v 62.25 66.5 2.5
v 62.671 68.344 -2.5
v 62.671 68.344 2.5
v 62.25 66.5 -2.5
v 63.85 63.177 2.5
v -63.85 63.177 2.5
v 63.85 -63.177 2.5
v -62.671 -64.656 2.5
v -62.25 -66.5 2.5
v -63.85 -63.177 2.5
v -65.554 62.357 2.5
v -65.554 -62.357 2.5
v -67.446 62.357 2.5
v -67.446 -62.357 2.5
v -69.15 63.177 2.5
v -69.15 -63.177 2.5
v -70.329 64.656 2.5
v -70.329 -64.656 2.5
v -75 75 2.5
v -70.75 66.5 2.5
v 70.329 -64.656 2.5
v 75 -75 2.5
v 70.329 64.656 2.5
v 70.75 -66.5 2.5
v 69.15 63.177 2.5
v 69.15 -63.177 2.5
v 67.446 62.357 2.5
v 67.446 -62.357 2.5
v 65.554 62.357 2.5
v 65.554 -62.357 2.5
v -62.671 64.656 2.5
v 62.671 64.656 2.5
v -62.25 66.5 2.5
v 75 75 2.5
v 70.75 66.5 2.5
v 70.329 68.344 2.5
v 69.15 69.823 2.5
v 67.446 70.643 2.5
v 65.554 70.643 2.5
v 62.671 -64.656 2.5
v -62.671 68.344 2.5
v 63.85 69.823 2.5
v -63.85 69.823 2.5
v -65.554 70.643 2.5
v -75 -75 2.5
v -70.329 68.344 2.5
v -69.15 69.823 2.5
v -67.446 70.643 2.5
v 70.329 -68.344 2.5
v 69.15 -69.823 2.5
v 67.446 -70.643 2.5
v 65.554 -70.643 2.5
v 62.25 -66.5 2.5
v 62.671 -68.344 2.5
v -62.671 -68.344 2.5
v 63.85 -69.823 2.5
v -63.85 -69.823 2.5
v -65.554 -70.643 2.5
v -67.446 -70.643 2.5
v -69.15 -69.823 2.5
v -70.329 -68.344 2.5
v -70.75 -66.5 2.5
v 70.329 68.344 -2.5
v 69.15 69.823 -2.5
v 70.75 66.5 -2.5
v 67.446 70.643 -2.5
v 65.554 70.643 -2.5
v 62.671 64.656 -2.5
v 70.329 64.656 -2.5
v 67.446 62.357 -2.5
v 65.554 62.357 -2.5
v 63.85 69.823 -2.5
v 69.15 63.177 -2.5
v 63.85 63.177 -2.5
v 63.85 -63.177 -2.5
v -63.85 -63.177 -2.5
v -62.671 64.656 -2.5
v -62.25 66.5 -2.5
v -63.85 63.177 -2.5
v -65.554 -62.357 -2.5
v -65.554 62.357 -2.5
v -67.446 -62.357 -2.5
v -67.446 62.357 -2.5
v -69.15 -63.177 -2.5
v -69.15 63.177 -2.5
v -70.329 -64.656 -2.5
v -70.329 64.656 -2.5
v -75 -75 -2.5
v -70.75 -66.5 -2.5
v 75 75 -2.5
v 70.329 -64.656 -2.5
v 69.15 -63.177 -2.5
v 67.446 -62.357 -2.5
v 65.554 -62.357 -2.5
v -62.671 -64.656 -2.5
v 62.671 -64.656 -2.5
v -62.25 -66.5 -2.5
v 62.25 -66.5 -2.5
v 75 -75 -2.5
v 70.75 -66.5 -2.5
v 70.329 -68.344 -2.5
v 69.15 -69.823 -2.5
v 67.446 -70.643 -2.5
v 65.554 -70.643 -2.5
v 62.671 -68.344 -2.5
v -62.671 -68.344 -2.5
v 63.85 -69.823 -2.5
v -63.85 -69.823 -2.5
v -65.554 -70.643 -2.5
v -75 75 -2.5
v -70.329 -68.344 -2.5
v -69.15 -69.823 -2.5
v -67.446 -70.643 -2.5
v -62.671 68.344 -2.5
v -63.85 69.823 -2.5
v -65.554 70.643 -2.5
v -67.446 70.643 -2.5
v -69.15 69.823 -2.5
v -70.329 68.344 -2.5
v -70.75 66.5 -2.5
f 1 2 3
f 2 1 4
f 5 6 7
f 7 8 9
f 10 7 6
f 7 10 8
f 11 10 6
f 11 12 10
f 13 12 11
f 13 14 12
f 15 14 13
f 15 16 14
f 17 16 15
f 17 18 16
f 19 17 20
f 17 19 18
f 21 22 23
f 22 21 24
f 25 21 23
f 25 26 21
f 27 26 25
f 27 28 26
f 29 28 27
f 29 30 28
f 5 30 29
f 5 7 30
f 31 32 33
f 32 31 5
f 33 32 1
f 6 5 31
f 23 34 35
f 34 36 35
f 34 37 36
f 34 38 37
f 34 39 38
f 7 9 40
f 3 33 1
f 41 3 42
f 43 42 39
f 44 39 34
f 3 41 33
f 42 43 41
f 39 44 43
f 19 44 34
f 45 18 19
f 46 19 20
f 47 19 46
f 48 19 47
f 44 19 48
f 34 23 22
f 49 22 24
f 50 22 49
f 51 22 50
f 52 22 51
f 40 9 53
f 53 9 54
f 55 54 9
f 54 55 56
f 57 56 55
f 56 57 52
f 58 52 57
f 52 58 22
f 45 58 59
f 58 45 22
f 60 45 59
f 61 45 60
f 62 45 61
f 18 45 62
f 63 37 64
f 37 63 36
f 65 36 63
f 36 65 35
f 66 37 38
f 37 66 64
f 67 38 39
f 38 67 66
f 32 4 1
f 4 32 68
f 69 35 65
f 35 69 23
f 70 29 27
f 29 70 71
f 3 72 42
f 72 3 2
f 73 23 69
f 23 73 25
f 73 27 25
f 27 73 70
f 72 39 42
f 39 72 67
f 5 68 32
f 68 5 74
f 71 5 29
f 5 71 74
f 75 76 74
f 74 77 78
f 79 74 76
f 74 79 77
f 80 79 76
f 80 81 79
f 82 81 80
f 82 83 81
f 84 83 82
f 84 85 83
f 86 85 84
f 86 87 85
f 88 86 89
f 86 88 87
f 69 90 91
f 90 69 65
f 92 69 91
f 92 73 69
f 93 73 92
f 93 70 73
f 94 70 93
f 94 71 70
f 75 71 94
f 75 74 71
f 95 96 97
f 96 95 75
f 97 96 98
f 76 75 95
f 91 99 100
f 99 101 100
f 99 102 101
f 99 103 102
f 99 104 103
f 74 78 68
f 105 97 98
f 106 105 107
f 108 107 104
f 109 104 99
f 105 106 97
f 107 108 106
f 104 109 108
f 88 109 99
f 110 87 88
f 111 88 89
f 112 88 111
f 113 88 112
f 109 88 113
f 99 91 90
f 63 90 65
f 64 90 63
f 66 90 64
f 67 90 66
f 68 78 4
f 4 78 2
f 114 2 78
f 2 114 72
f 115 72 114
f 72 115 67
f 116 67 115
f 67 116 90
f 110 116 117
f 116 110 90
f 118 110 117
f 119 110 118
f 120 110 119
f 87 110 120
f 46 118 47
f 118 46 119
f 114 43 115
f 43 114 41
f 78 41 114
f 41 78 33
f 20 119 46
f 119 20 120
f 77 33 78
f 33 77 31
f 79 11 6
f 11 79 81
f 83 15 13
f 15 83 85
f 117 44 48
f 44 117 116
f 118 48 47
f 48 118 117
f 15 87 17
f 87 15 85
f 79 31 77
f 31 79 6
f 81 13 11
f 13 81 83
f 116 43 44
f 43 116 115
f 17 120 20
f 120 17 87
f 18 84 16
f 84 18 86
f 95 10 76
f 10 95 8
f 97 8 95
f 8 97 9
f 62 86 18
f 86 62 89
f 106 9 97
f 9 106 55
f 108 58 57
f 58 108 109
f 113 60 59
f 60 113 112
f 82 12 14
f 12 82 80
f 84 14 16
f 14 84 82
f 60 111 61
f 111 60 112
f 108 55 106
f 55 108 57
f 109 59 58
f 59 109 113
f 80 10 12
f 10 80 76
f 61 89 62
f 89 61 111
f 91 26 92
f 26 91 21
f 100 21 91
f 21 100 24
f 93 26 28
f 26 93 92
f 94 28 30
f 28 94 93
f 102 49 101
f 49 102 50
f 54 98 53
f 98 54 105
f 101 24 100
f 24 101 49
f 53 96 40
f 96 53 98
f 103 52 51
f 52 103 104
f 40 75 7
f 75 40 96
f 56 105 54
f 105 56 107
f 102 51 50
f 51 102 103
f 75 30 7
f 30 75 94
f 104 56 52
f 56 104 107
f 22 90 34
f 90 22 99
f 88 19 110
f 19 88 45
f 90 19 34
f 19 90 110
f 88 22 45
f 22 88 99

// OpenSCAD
// Generated by SolidPython 1.1.3 on 2023-12-07 16:50:21


difference() {
	cube(center = true, size = [150, 150, 5]);
	union() {
		translate(v = [66.5000000000, 66.5000000000]) {
			cylinder(center = true, h = 5, r = 4.2500000000);
		}
		translate(v = [-66.5000000000, 66.5000000000]) {
			cylinder(center = true, h = 5, r = 4.2500000000);
		}
		translate(v = [-66.5000000000, -66.5000000000]) {
			cylinder(center = true, h = 5, r = 4.2500000000);
		}
		translate(v = [66.5000000000, -66.5000000000]) {
			cylinder(center = true, h = 5, r = 4.2500000000);
		}
	}
}
/***********************************************
*********      SolidPython code:      **********
************************************************
 
import solid
import numbers
import pudb
from solid.utils import *
import viewscad
import subprocess
import os
import os.path as osp
import math
import sys

chamfer_extrude=solid.import_scad("./chamfer_extrude.scad")
chamfer_extrude=chamfer_extrude.chamfer_extrude
r = viewscad.Renderer(width=800, height=800)

def debug(model,f_name,path="/home/ts/code/projects/mfd/designs/debug"):
    solid.scad_render_to_file(model,osp.join(path,f_name)+".scad")
#generate position list of wells using offset from center
wells_pos_from_center_4 = lambda offset: [[-offset,offset],
                                        [offset, offset],
                                        [-offset, -offset],
                                        [offset, -offset]]
#wells_pos_from_center_2 = lambda offset: [[0,offset],
#                                        [0, -offset]]
wells_pos_from_center_2 = lambda offset: [[offset,0],
                                        [-offset,0]]

def make_well(dims,shape=None,height=None,dxf=False):
    def circle_cylinder():
        if dxf or (height is None):
            well = solid.circle(r=dims, segments=64)
        else:
            well = solid.cylinder(r=dims, h=height, segments=64, center = True)
        return well
    if dims is None:
        sys.exit("radius needs to be a number")
    if isinstance(dims, numbers.Number):
        well =circle_cylinder()
    elif len(dims)==1:
        if isinstance(dims[1], numbers.Number):
            well =circle_cylinder()
        else:
            sys.exit("radius needs to be a number")
    elif len(dims)==2:
        well = solid.square(dims,center = True)
    elif len(dims)==3:
        well = solid.cube(dims, center = True)
    return well

def wells_top_bottom(center_gap,device_dims=None,shape=None,height=None, positions = None, dxf = False,well_shape=None):
    if well_shape == None:
        well_shape = make_well(device_dims,shape=shape,height=height,dxf=dxf)
    wells = []
    if positions is None:
        offset = radius+radius/2.0
        positions = wells_pos_from_center_2(offset)
    if dxf or (height is None):
        height = 0
    for position in positions:
        if dxf:
            wells.append(solid.translate([position[0],position[1]])(well_shape))
        else:
            wells.append(solid.translate([position[0],position[1],height/2.0])(well_shape))
    return  union()(*wells)

#place wells in four corners 
def four_corner(radius,height=None, positions = None, dxf = False):
    #if well pos not specified set
    #to equally spaced by half radius
    if positions is None:
        offset = radius+radius/2.0
        positions = wells_pos_from_center_4(offset)
    if dxf or (height is None):
        height = 0
    #make wells at positions with specified radius and height
    wells = []
    for position in positions:
        #make circle if making dxf
        if dxf:
            well_shape = solid.circle(r=radius, segments=64)
            well_shape = solid.translate([position[0],position[1]])(well_shape)
        #if stl make cylinder
        else:
            well_shape = solid.cylinder(r=radius, h=height, segments=64, center = True)
            well_shape = solid.translate([position[0],position[1],height/2.0])(well_shape)
        wells.append(well_shape)
    return  union()(*wells)

#generate channels 
def make_channels(length,width,height=0,num_chans=1,max_chans=None,spacing=None, dxf = False,
                  rotate_channels=False):
    if dxf or (height is None):
        height = 0
    #if channel gap not defined, is equal to
    if spacing is None: spacing = width
    #calculate number of channels if fitting max num within given width
    if not max_chans is None:
        import math
        num_chans = math.floor((max_chans-spacing)/(width+spacing))
    #get total width of channel section  
    total_width = (width*num_chans)+(spacing*(num_chans-1))

    #make template channel
    #if rotate_channels: width, length = length, width
    if dxf:
        channel_t = solid.square([length,width],center = True)
    else:
        channel_t = solid.cube([length,width,height], center = True)

    #if number channels is even, offset the first channel to center its gap
    if num_chans % 2 == 0: centering = -(width/2.0+spacing/2.0)
    else: centering = 0
    #move template channel up to align bottom at z = 0 
    #and offset center if necessary
    if dxf:
        channel_t = solid.translate([0,centering])(channel_t)
    else:
        channel_t = solid.translate([0,centering,height/2.0])(channel_t)

    #if rotate_channels: length,width = width,length
    #start making the channels
    channels = []
    for i in range(num_chans):
        #if i=0 there is no translation
        #if i=1, we make the first channel adjacent to second
        direction = i

        #if i>=1, we add channels alternating left and right
        if i >= 1:
            direction = -(i/2.0)
            if i % 2 == 1: direction = (-direction)+0.5
                
        #make channel at right position and add it to channel list
        translation_coords = [0,direction*(width+spacing)]
        #if rotate_channels: translation_coords = [direction*(width+spacing),0]
        if dxf:
            channel = solid.translate(translation_coords)(channel_t)
        else:
            channel = solid.translate([*translation_coords,0])(channel_t)
        channels.append(channel)
    
    #group all channels as one object
    channels = union()(*channels)
    #compute the x,y,z dimensions in order to pass as arguments 
    #for construction of other parts of device (such as the chambers)
    measurements = {'x':(length/2.0,-length/2.0),
                    'y':(total_width/2.0,-total_width/2.0)}
    if not dxf:
        measurements['z'] = (height,0)
    if rotate_channels:
        channels = solid.rotate(90)(channels)
        measurements['x'],measurements['y']=measurements['y'],measurements['x']
    return channels,measurements

def make_chambers(msrs,height=None,extra=0,len_until=None,width=None, dxf = False):
    #computes x,y,z length
    total = lambda x : abs(x[0]) + abs(x[1])
    
    #if specific height if specified
    #otherwise use same height as channels
    if dxf:
        pass
    elif not height is None:
        msrs['z'] = (height,0)
    else:
        msrs['z'] = (0,0)
        
    #make copy of measurements from channels to modify chamber dimensions 
    #and add length to chambers as specified
    chamber_dims = msrs.copy()
    #calculate length of chamber to reach specified offset
    if not len_until is None:
        chamber_len = len_until-(msrs['x'][0])
    #or add specified length to channel length (if not specified, adds 0)
    else:
        chamber_len = msrs['x'][0]+extra
    #set the chamber length based 
    chamber_dims['x'] = (chamber_len/2.0,-(chamber_len/2.0))
    #compute final dimensions of chamber
    if not width is None:
        chamber_dims['y'] = (width/2.0,-width/2.0)
    chamber_dims = [total(size) for size in chamber_dims.values()]
        
    #calculate chamber translation offset to place adjacent to channels
    chamber_trslt = msrs['x'][0]+(chamber_len/2.0)
    #compute chamber translation coordinates to align with channels
    #x = 1 moves chamber above channels
    #x = -1 moves chamber below channels
    if dxf:
        trslt = lambda x : [x*(chamber_trslt),0]
    else:
        trslt = lambda x : [x*(chamber_trslt),0,msrs['z'][0]/2.0]
    
    #function to make chamber at top or at bottom 
    if dxf:
        move = lambda x : solid.translate(trslt(x))(solid.square(chamber_dims, center = True) )
    else:
        move = lambda x : solid.translate(trslt(x))(solid.cube(chamber_dims,center = True))
    #make top and bottom chambers and return them as grouped
    top = move(1)
    bottom = move(-1)
    #chambers=solid.rotate(90)(solid.union()(top,bottom))
    chambers=(solid.union()(top,bottom))

    return chambers

#create alignment features 
def alignment_features(unit,dims,grid_size, mask_size = None, alignment = "hollow", units_from_center = (2.5,2.5), corner_len=None):
    width = grid_size[0]*dims[0]
    length = grid_size[1]*dims[1]
    if mask_size is None and corner_len is None:
        corner_len = (dims[0] + dims[1]) /2 / 8
    corner = lambda thickness_div : solid.union()( solid.square([corner_len,corner_len/thickness_div],center=False), solid.square([corner_len/thickness_div,corner_len],center=False) )
    
    def make_full(thickness_div):
        thickness = corner_len/thickness_div
        tr = solid.translate([0, 0, 0 ])(solid.rotate(180)(corner(thickness_div)))
        tr = solid.translate([thickness/2,thickness/2,0])(tr)
        bl = solid.translate([0, 0, 0 ])(solid.rotate(0)(corner(thickness_div)))
        bl = solid.translate([-thickness/2,-thickness/2,0])(bl)
        return solid.union()(tr,bl)
    
    def make_hollow(thickness_div):
        thickness = corner_len/(thickness_div/2)
        inner = make_full(thickness_div)
        outer = make_full(thickness_div/2)
        hollow = outer - inner 
        return hollow
    
    center = (width /2 , length/2)
    mask_pos = lambda x,y : (center[0] + x*(float(units_from_center[0])*dims[0]), center[1] + y*(float(units_from_center[1])*dims[1]))
    positions = []
    positions.append(mask_pos(1,0))
    positions.append(mask_pos(0,1))
    positions.append(mask_pos(-1,0))
    positions.append(mask_pos(0,-1))
    make_mask = lambda mtype : make_hollow(8) if mtype == "hollow" else make_full(8)
    masks = [ solid.translate([*position,0])(make_mask(alignment)) for position in positions]
    
    solid.scad_render_to_file(solid.union()(*masks),"./designs/open_chamber/masks.scad")
    #return unit - solid.union()(*masks)
    return solid.union()(*masks,unit)

def create_outline(thickness, array, dims, grid_size,):
    width = grid_size[0]*dims[0] + thickness *2
    length = grid_size[1]*dims[1] + thickness *2
    outer = solid.translate([-thickness, -thickness,0])(solid.square([width, length]))
    return outer-array

def create_wall(wall_thickness, outline_thickness, dims, grid_size, wall_height = 2000, dxf = False):
    inner_width = grid_size[0]*dims[0] + outline_thickness *2
    inner_length = grid_size[1]*dims[1] + outline_thickness *2
    outer_width = inner_width + wall_thickness * 2
    outer_length = inner_length + wall_thickness * 2
    outer_pos_x = -outline_thickness-wall_thickness
    outer_pos_y = -outline_thickness-wall_thickness
    inner_pos_x = -outline_thickness
    inner_pos_y = -outline_thickness
    if dxf:
        inner_wall = solid.translate([inner_pos_x,
                                      inner_pos_y,
                                      0])(solid.square([inner_width, inner_length]))
        outer_wall = solid.translate([outer_pos_x,
                                      outer_pos_y,
                                      0])(solid.square([outer_width, outer_length]))

        return outer_wall-inner_wall
    else:
        inner_wall = solid.translate([inner_pos_x,
                                      inner_pos_y,
                                      0])(solid.cube([inner_width, inner_length,wall_height]))
        outer_wall = solid.translate([outer_pos_x,
                                      outer_pos_y,
                                      0])(solid.cube([outer_width, outer_length,wall_height]))

        return outer_wall-inner_wall, {'wall_height': wall_height,
                                       'wall_thickness': wall_thickness,
                                       'inner_width':inner_width,
                                       'inner_length': inner_length,
                                       'outer_width': outer_width,
                                       'outer_length': outer_length,
                                       'outer_pos_x' : outer_pos_x,
                                       'outer_pos_y' : outer_pos_y,
                                       'inner_pos_x' : inner_pos_x,
                                       'inner_pos_y' : inner_pos_y}

def create_thicker_wall(wall_thickness, outer_wall_offset, wall_dims, dims, grid_size, height_start = .2, height_end=2, dxf = False):
    addon_wall,thicker_wall_dims = create_wall(wall_thickness, outer_wall_offset, dims, grid_size, wall_height=height_end-height_start, dxf = False)
    addon_wall = solid.translate([0,0,height_start])(addon_wall)

    thicker_wall_dims['wall_height'] = height_end
    thicker_wall_dims['wall_thickness'] = wall_dims['wall_thickness'] + wall_thickness
    return addon_wall, thicker_wall_dims
 
def add_lock_to_wall(wall,wall_dims,y_offset = 0,cut_ratio=0.7,L_length=3, gap_ratio=0.05, axis="x",width_ratio=1/2):
    # Makes L shape
    def make_L(max_length,length_thickness,max_width,width_thickness,height,y_offset):
        length = solid.cube([max_length,length_thickness,height])
        width = solid.cube([width_thickness,max_width,height])
        width = solid.translate([max_length-(width_thickness),0,0])(width)
        L = solid.union()(width,length)
        debug(L,"L")
        if axis == "x":
            L = solid.rotate(-90)(L)
            L = solid.translate([0,max_length,0])(L)
        else:
            L = solid.rotate(-180)(L)
            L = solid.translate([max_length,max_width,0])(L)
        return solid.translate([0,0,y_offset])(L)
    
    lock_length = L_length
    lock_width = wall_dims['wall_thickness']*width_ratio
    lock_length_thickness = lock_width/2
    lock_width_thickness = lock_width/2
    L_lock = make_L(lock_length,lock_length_thickness,lock_width,lock_width_thickness, wall_dims['wall_height']-y_offset, y_offset)
    
    margin_space = lock_length - lock_length*(1-gap_ratio)
    key_length = lock_length-margin_space
    key_length_thickness = lock_length_thickness-(margin_space*2)
    key_width = lock_width-(margin_space*2)
    key_width_thickness = lock_width_thickness-(margin_space*2)
    L_key = make_L(key_length,key_length_thickness,key_width,key_width_thickness, wall_dims['wall_height']-y_offset, y_offset)
    L_key = solid.translate([margin_space,margin_space,0])(L_key)
    L = solid.union()(L_lock,L_key)
    debug(L,"L")
    
    #Make cube to be used as negative to split frame in a half
    #Can choose if making left or right negative, specify ratio of split
    def make_negative(right,cut_ratio):
        if axis == "x":
            if right:
                length = wall_dims['outer_length']*(1-cut_ratio)
                pos_x = wall_dims['outer_pos_x']+(wall_dims['outer_length']*cut_ratio)
            else:
                length = wall_dims['outer_length']*(cut_ratio)
                pos_x = wall_dims['outer_pos_x'] 
            negative = solid.cube([wall_dims['outer_width'],length, wall_dims['wall_height']])
            negative = solid.translate([wall_dims['outer_pos_y'],pos_x,0])(negative)
        else:
            if right:
                length = wall_dims['outer_width']*(1-cut_ratio)
                pos_x = wall_dims['outer_pos_y']+(wall_dims['outer_width']*cut_ratio)
            else:
                length = wall_dims['outer_width']*(cut_ratio)
                pos_x = wall_dims['outer_pos_y'] 
            negative = solid.cube([length,wall_dims['outer_length'], wall_dims['wall_height']])
            negative = solid.translate([pos_x,wall_dims['outer_pos_x'],0])(negative)
        return negative, pos_x, length 
                      
    #Make negatives
    negative_right, right_half_pos_x, right_half_length = make_negative(True,cut_ratio)
    negative_left, left_half_pos_x, right_half_length = make_negative(False,cut_ratio)
    #Make halves
    left_half = solid.difference()(wall,negative_right)
    right_half = solid.difference()(wall,negative_left)
    def place_L(L, L_length,L_width):
        #Place L on top wall       
        offset_to_center = (wall_dims['wall_thickness']-L_width)/2
        if axis == "x":
            y_pos_top = (wall_dims['outer_pos_y'] +
                    wall_dims['outer_width'] - 
                    L_width - offset_to_center)
            top_L = solid.translate([y_pos_top,
                                     right_half_pos_x-(L_length),
                                     0])(L)
            #Place L on bottom wall       
            y_pos_bottom = wall_dims['outer_pos_y']+offset_to_center
            bottom_L = solid.translate([y_pos_bottom,
                                        right_half_pos_x-L_length,
                                        0])(L)
        else:
            y_pos_top = (wall_dims['outer_pos_x'] +
                    wall_dims['outer_length'] -
                    (L_width+offset_to_center))
            top_L = solid.translate([right_half_pos_x-L_length,
                                     y_pos_top,
                                     0])(L)
            #Place L on bottom wall       
            y_pos_bottom = wall_dims['outer_pos_y']+offset_to_center
            bottom_L = solid.translate([right_half_pos_x-L_length,
                                        y_pos_bottom,
                                        0])(L)
        return bottom_L, top_L
    #Make complimentary L pieces through union and differences
    #Make Lock
    bottom_L_lock, top_L_lock = place_L(L_lock,L_length,lock_width)
    left_half = solid.difference()(left_half,bottom_L_lock)
    left_half = solid.difference()(left_half,top_L_lock)
    #Make Key
    bottom_L_key, top_L_key = place_L(L_key,L_length,lock_width)
    right_half = solid.union()(right_half,bottom_L_key)
    right_half = solid.union()(right_half,top_L_key)
    return left_half, right_half


#build a row x col grid of containment units
def make_unit_array(unit,dims,grid_size, dxf = False, alignment = None, mask_size = None,
                    units_from_center = None,alignment_offset=None, alignment_mark_size=1):
    units = []
    for col in range(grid_size[1]):
        for row in range(grid_size[0]):
            if dxf:
                units.append(solid.translate([row*dims[0],col*dims[1]])(unit))
            else:
                units.append(solid.translate([row*dims[0],col*dims[1],dims[2]/2.0])(unit))
    array = solid.union()(*units)
    if (not alignment is None) and dxf:
        if not alignment_offset is None:
            array = solid.translate([alignment_offset[0],alignment_offset[1]])(array)
        array = alignment_features(array,dims, grid_size, alignment = alignment, mask_size = None, units_from_center = units_from_center,corner_len=alignment_mark_size)
        if not alignment_offset is None:
            array = solid.translate([-alignment_offset[0],-alignment_offset[1]])(array)
    return array


def make_taylor(wells_pos = wells_pos_from_center_4(2.25), well_rad = 1.5 ,
                well_height = 2, chan_w = 0.01, chan_l = 1, chan_h = 0.010 ,
                chan_gap = 0.040, max_chans = None,num_chans=100, chamber_height  = 0.100,
                columns = 1, rows = 1, chamber_len_until=2.25, add_channels = True, add_wells = True, 
                add_chambers = True, save_path = "./", alignment = None, units_from_center = 2,
                mask_size = None, render_stl = False, outline_thickness = 0.050, dxf = True,
                wall_height = 15, wall_thickness = 0.95, casing_x=9, casing_y=9, casing_z=0,rotate_units=0):

    dims = [casing_x, casing_y, casing_z]
    wells = four_corner(well_rad,well_height, dxf = dxf, positions = wells_pos)
    debug(wells,"wells")
    channels, msrs = make_channels(chan_l,chan_w,chan_h,dxf=dxf, spacing = chan_gap, max_chans=max_chans,num_chans=num_chans)
    debug(channels,"channels")
    chambers = make_chambers(msrs,dxf = dxf, height=chamber_height,len_until=chamber_len_until)
    debug(chambers,"chambers")

    #add together and render
    device_parts = []
    if add_channels:
        device_parts.append(channels)
    if add_wells:
        device_parts.append(wells)
    if add_chambers:
        device_parts.append(chambers)
    device=union()(*device_parts)
    device = rotate(rotate_units)(device)

    device=solid.translate([dims[0]/2.0,dims[1]/2.0,0])(device)
    channels = rotate(rotate_units)(channels)
    channels=solid.translate([dims[0]/2,dims[1]/2,0])(channels)
    chambers_wells = union()(wells,chambers)
    chambers_wells = rotate(rotate_units)(chambers_wells)
    chambers_wells=solid.translate([dims[0]/2,dims[1]/2,0])(chambers_wells)

    file_name = str(rows)+'x'+str(columns)+'_units_'
    grid_size = [rows,columns]

    if alignment:
        alignment="full"
    device = make_unit_array(device,dims,grid_size, dxf=dxf, alignment = alignment,
                                 units_from_center = units_from_center)
    channels = make_unit_array(channels,dims,grid_size, dxf=dxf, alignment = alignment,
                                 units_from_center = units_from_center)
    if alignment=="full":
        alignment="hollow"

    chambers_wells = make_unit_array(chambers_wells,dims,grid_size, dxf=dxf, alignment = alignment,
                                 units_from_center =units_from_center)

    def save_model(model,prefix):
        model_fname = os.path.abspath(save_path+prefix+"_"+file_name+".scad")
        solid.scad_render_to_file(model,model_fname)
        return model_fname

    wells_fname = save_model(wells,"wells")
    channels_fname = save_model(channels,"channels")
    device_fname = save_model(device,"device")
    chambers_wells_fname = save_model(chambers_wells,"chambers_wells")
    return (chambers_wells,chambers_wells_fname), (channels,channels_fname), (device,device_fname)

def make_device(design='open',rows=8,columns=6,wells_pos = 4.5,well_offset=3.2, well_rad=3.2,well_height=0.1,
                chan_l=1,chan_w=0.01,chan_h=0.01,chan_gap=0.015,num_chans=101,dxf=True,save_path="./designs/open_chamber/",
                casing_x=9.0,casing_y=18.0,casing_z=0,rotate_units=90,units_from_center=(3,1),chamber_len_until=4.5,
                chamber_width=None,alignment=True, add_wells=True, add_channels=True,add_chambers=True,well_shape=None):

    dims = [casing_x, casing_y, casing_z]
    if design == "open":
        wells_pos=wells_pos_from_center_2(wells_pos)
        wells = wells_top_bottom(well_offset*2,device_dims=well_rad,height=well_height, dxf = dxf, positions = wells_pos,well_shape=well_shape)
    elif design == "closed":
        wells_pos=wells_pos_from_center_4(wells_pos)
        debug(wells,"wells")
        wells = four_corner(well_offset,well_height,device_dims=well_rad, dxf = dxf, positions = wells_pos)
    else:
        print(design+" is not a valid design.\n Choose valid design: 'open' or 'closed'")
        exit()
    wells = rotate(rotate_units)(wells)
    wells=solid.translate([dims[0]/2,dims[1]/2,0])(wells)
    debug(wells,"wells")

    channels, msrs = make_channels(chan_l,chan_w,chan_h,dxf=dxf, spacing = chan_gap, num_chans=num_chans,rotate_channels=False)
    channels = rotate(rotate_units)(channels)
    channels=solid.translate([dims[0]/2,dims[1]/2,0])(channels)

    chambers=make_chambers(msrs,height=None,extra=0,len_until=chamber_len_until, width=chamber_width,dxf = dxf)
    chambers = rotate(rotate_units)(chambers)
    chambers=solid.translate([dims[0]/2,dims[1]/2,0])(chambers)

    device_parts = []
    if add_channels:
        device_parts.append(channels)
    if add_wells:
        device_parts.append(wells)
    if add_chambers:
        device_parts.append(chambers)
    device = union()(*device_parts)
    #device = rotate(rotate_units)(device)
    #device=solid.translate([dims[0]/2.0,dims[1]/2.0,0])(device)

    chambers_wells = []
    if add_chambers:
        chambers_wells.append(chambers)
    if add_wells:
        chambers_wells.append(wells)
    chambers_wells = union()(*chambers_wells)
    #chambers_wells = union()(wells,chambers)
    #chambers_wells = rotate(rotate_units)(chambers_wells)
    #chambers_wells=solid.translate([dims[0]/2,dims[1]/2,0])(chambers_wells)

    file_name = str(rows)+'x'+str(columns)+'_units_'

    grid_size = [rows,columns]
    if alignment:
        alignment="full"
    device = make_unit_array(device,dims,grid_size, dxf=dxf, alignment = alignment,
                                 units_from_center = units_from_center)
    channels = make_unit_array(channels,dims,grid_size, dxf=dxf, alignment = alignment,
                                 units_from_center = units_from_center)
    if alignment=="full":
        alignment="hollow"

    chambers_wells = make_unit_array(chambers_wells,dims,grid_size, dxf=dxf, alignment = alignment,
                                 units_from_center =units_from_center)

    def save_model(model,prefix):
        model_fname = os.path.abspath(save_path+prefix+"_"+file_name+".scad")
        solid.scad_render_to_file(model,model_fname)
        return model_fname

    wells_fname = save_model(wells,"wells")
    channels_fname = save_model(channels,"channels")
    device_fname = save_model(device,"device")
    chambers_wells_fname = save_model(chambers_wells,"chambers_wells")
    return (chambers_wells,chambers_wells_fname), (channels,channels_fname), (device,device_fname)


def make_open_chamber(rows=8,columns=6,wells_pos = wells_pos_from_center_2(4.5), well_rad=3.2,well_height=0.1,
                      chan_l=1,chan_w=0.01,chan_h=0.01,chan_gap=0.015,num_chans=101,dxf=True,save_path="./designs/open_chamber/",
                      casing_x=9.0,casing_y=18.0,casing_z=0,rotate_units=90,units_from_center=(3,1),chamber_len_until=4.5,
                      chamber_width=None,alignment=True, add_wells=True, add_channels=True,add_chambers=True,well_shape=None):

    dims = [casing_x, casing_y, casing_z]
    wells = wells_top_bottom(well_rad,height=well_height, dxf = dxf, positions = wells_pos, well_shape=well_shape)
    channels, msrs = make_channels(chan_l,chan_w,chan_h,dxf=dxf, spacing = chan_gap, num_chans=num_chans,rotate_channels=False)
    chambers=make_chambers(msrs,height=None,extra=0,len_until=chamber_len_until, width=chamber_width,dxf = dxf)
    debug(chambers,"chambers")
    device_parts = []
    if add_channels:
        device_parts.append(channels)
    if add_wells:
        device_parts.append(wells)
    if add_chambers:
        device_parts.append(chambers)
    device = union()(*device_parts)
    device = rotate(rotate_units)(device)
    device=solid.translate([dims[0]/2.0,dims[1]/2.0,0])(device)
    channels = rotate(rotate_units)(channels)
    channels=solid.translate([dims[0]/2,dims[1]/2,0])(channels)
    chambers_wells = union()(wells,chambers)
    chambers_wells = rotate(rotate_units)(chambers_wells)
    chambers_wells=solid.translate([dims[0]/2,dims[1]/2,0])(chambers_wells)

    file_name = str(rows)+'x'+str(columns)+'_units_'

    grid_size = [rows,columns]
    if alignment:
        alignment="full"
    device = make_unit_array(device,dims,grid_size, dxf=dxf, alignment = alignment,
                                 units_from_center = units_from_center)
    channels = make_unit_array(channels,dims,grid_size, dxf=dxf, alignment = alignment,
                                 units_from_center = units_from_center)
    if alignment=="full":
        alignment="hollow"

    chambers_wells = make_unit_array(chambers_wells,dims,grid_size, dxf=dxf, alignment = alignment,
                                 units_from_center =units_from_center)

    def save_model(model,prefix):
        model_fname = os.path.abspath(save_path+prefix+"_"+file_name+".scad")
        solid.scad_render_to_file(model,model_fname)
        return model_fname

    wells_fname = save_model(wells,"wells")
    channels_fname = save_model(channels,"channels")
    device_fname = save_model(device,"device")
    chambers_wells_fname = save_model(chambers_wells,"chambers_wells")
    return (chambers_wells,chambers_wells_fname), (channels,channels_fname), (device,device_fname)

def to_dxf(scad_path):
    dxf_path = scad_path.replace(".scad",".dxf")
    subprocess.call(["openscad", "-o", dxf_path, scad_path])
    import ezdxf
    temp_dxf = ezdxf.readfile(dxf_path)
    temp_dxf.saveas(dxf_path)

#def make_walls(diameter,thickness,grid_size,dims,height=20,segments=256,make_inner=True):
#    wafer_wall_out = solid.cylinder(r=diameter/2,h=height, segments=segments)
#    wafer_wall_in = solid.cylinder(r=(diameter/2-thickness),h=height, segments=segments)
#    wafer_wall = solid.difference()(wafer_wall_out,wafer_wall_in)
#    wafer_wall = solid.translate([grid_size[1]*dims[1]/2.0,grid_size[0]*dims[0]/2.0])(wafer_wall)
#
#    vertical_wall_length = grid_size[1]*dims[1]
#    horizontal_wall_length = grid_size[0]*dims[0]
#    vertical_wall = solid.cube([vertical_wall_length,thickness,height],center = True)
#    vertical_wall = solid.translate([vertical_wall_length/2,0,height/2])(vertical_wall)
#    horizontal_wall = solid.cube([thickness,horizontal_wall_length,height],center = True)
#    horizontal_wall = solid.translate([0,vertical_wall_length/2,height/2])(horizontal_wall)
#    walls = []
#    walls.append(horizontal_wall)
#    walls.append(vertical_wall)
#    for col in range(grid_size[1]):
#        if col == grid_size[1]-1: 
#            walls.append(solid.translate([0,(col+1)*dims[1]])(vertical_wall))
#        elif col > 0 and col < grid_size[1]-1 and make_inner==True:
#            walls.append(solid.translate([0,(col+1)*dims[1]])(vertical_wall))
#    for row in range(grid_size[0]):
#        if row == grid_size[0]-1: 
#            walls.append(solid.translate([(row+1)*dims[0],0])(horizontal_wall))
#        elif row > 0 and row < grid_size[0]-1 and make_inner==True:
#            walls.append(solid.translate([(row+1)*dims[0],0])(horizontal_wall))
#    walls = union()(*walls)
#    wafer_walls = union()(walls,wafer_wall)
#    return walls,wafer_wall,wafer_walls

def make_walls(diameter,thickness,grid_size,dims,height=20,segments=256,make_inner=True,padx=0,pady=0):
    wafer_wall_out = solid.cylinder(r=diameter/2,h=height, segments=segments)
    wafer_wall_in = solid.cylinder(r=(diameter/2-thickness),h=height, segments=segments)
    wafer_wall = solid.difference()(wafer_wall_out,wafer_wall_in)
    wafer_wall = solid.translate([grid_size[1]*dims[1]/2.0,grid_size[0]*dims[0]/2.0])(wafer_wall)

    vertical_wall_length = grid_size[0]*dims[0]+padx
    horizontal_wall_length = grid_size[1]*dims[1]+pady
    vertical_wall = solid.cube([vertical_wall_length,thickness,height],center = True)
    vertical_wall = solid.translate([vertical_wall_length/2-pady/2,-padx/2,height/2])(vertical_wall)
    horizontal_wall = solid.cube([thickness,horizontal_wall_length,height],center = True)
    horizontal_wall = solid.translate([-pady/2,horizontal_wall_length/2-padx/2,height/2])(horizontal_wall)
    walls = []
    walls.append(horizontal_wall)
    walls.append(vertical_wall)
    for col in range(grid_size[1]):
        if col == grid_size[1]-1: 
            walls.append(solid.translate([0,(col+1)*dims[1]+pady])(vertical_wall))
        elif col > 0 and col < grid_size[1]-1 and make_inner==True:
            walls.append(solid.translate([0,(col+1)*dims[1]])(vertical_wall))
    for row in range(grid_size[0]):
        if row == grid_size[0]-1: 
            walls.append(solid.translate([(row+1)*dims[0]+padx,0])(horizontal_wall))
        elif row > 0 and row < grid_size[0]-1 and make_inner==True:
            walls.append(solid.translate([(row+1)*dims[0],0])(horizontal_wall))
    walls = union()(*walls)
    wafer_walls = union()(walls,wafer_wall)
    return walls,wafer_wall,wafer_walls

def save_model(model,base_path,base_name,dxf=True):
    if not os.path.exists(base_path):
        os.makedirs(base_path)
    dxf_path=osp.join(base_path,base_name+".scad")
    solid.scad_render_to_file(model,osp.join(dxf_path))
    if dxf:
        to_dxf(dxf_path)

def make_wafer(diameter,flat_len,thickness):
    wafer = solid.cylinder(r1=diameter/2,r2=diameter/2,h=thickness,segments=512,)()
    x_start_flat=(flat_len/2)
    y_start_flat = math.sqrt(((diameter/2)**2) - (x_start_flat**2) )
    height_delete_flat=diameter/2-y_start_flat
    flat_delete = solid.cube([flat_len,height_delete_flat,thickness],center=False)()
    flat_delete = solid.translate([-flat_len/2,y_start_flat,0])(flat_delete)
    wafer = solid.difference()(wafer,flat_delete)
    wafer = solid.rotate(90)(wafer)
    return wafer

def add_wafer_to_mask(wafer_size,flat_len,mask,grid_size,dims,wafer_line_thickness=0.1,outer_mask_thickness=5,alignment_offset=None):
    def make_wafer_mask(wafer_size,flat_len):
        wafer_mask = make_wafer(wafer_size,flat_len,1)
        wafer_mask = solid.projection()(wafer_mask)
        wafer_mask = solid.translate([grid_size[0]*dims[0]/2.0,grid_size[1]*dims[1]/2.0])(wafer_mask)
        if not alignment_offset is None:
            wafer_mask = solid.translate([-alignment_offset[0],-alignment_offset[1]])(wafer_mask)
        return wafer_mask

    inner_wafer_line_mask = make_wafer_mask(wafer_size-wafer_line_thickness/2,flat_len)
    outer_wafer_line_mask = make_wafer_mask(wafer_size+wafer_line_thickness/2,flat_len)
    outer_wafer_mask = make_wafer_mask(wafer_size+outer_mask_thickness,flat_len)
    outer_wafer_mask = solid.difference()(outer_wafer_mask,outer_wafer_line_mask)
    wafer_mask = solid.union()(outer_wafer_mask,inner_wafer_line_mask)

    return solid.difference()(wafer_mask,mask)

def make_posts(post_shape,post_height):
    posts = solid.linear_extrude(height=post_height)(post_shape)
    return posts

def make_wafer_empty(diameter,flat_len,thickness,margin,notch_len=20,notch_height=5,oversize=1.01):
    diameter*=oversize
    flat_len*=oversize
    wafer = make_wafer(diameter,flat_len,thickness)
    holder = solid.cylinder(r1=diameter/2+margin,r2=diameter/2+margin,h=thickness,segments=512)()
    holder = solid.difference()(holder,wafer)

    x_start_flat=(flat_len/2)
    y_start_flat = math.sqrt(((diameter/2)**2) - (x_start_flat**2) )
    height_delete_flat=diameter/2-y_start_flat
    notch = solid.cube([notch_len,notch_height,thickness],center=False)()
    notch = solid.translate([-notch_len/2,y_start_flat,0])(notch)
    notch = solid.rotate(90)(notch)
    return solid.difference()(holder,notch)

def wafer_print_calibration(diameter,thickness,height,z_offset):
    circles = []
    radii = []
    radii.append(diameter/2.0*0.8)
    radii.append(diameter/2.0*0.6)
    radii.append(diameter/2.0*0.4)
    radii.append(diameter/2.0*0.2)
    for radius in radii:
        inner = solid.cylinder(r1=radius-(thickness/2.0),r2=radius-(thickness/2.0),h=thickness,segments=512,)()
        outer = solid.cylinder(r1=radius+(thickness/2.0),r2=radius+(thickness/2.0),h=thickness,segments=512,)()
        diff = solid.difference()(outer,inner)
        circles.append(diff)
    circles = solid.union()(*circles)
    circles = solid.translate([0,0,z_offset])(circles)
    return circles

def make_rack(wells,dims,grid_size,alignment_offset,rack_x,rack_y,rack_thickness,bolt_width,add_bolts=True):

    #get X and Y dimensions of gride of pipette tips
    X_len = dims[0]*grid_size[0]
    Y_len = dims[1]*grid_size[1]
    #make rack
    rack = solid.cube([rack_x,rack_y,rack_thickness],center=True)

    if add_bolts:
    #add bolt holes
        bolt_hole=solid.cylinder(r=bolt_width/2,h=rack_thickness,center=True)()
        bolt_holes = []
        bolt_holes.append(solid.translate([rack_x/2-1.5*bolt_width,rack_y/2-1.5*bolt_width])(bolt_hole))
        bolt_holes.append(solid.translate([-rack_x/2+1.5*bolt_width,rack_y/2-1.5*bolt_width])(bolt_hole))
        bolt_holes.append(solid.translate([-rack_x/2+1.5*bolt_width,-rack_y/2+1.5*bolt_width])(bolt_hole))
        bolt_holes.append(solid.translate([rack_x/2-1.5*bolt_width,-rack_y/2+1.5*bolt_width])(bolt_hole))
        bolt_holes = solid.union()(*bolt_holes)
        rack=solid.difference()(rack,bolt_holes)
    rack_support = rack

    #center rack with pipette holes
    rack = solid.translate([0,0,rack_thickness/2])(rack)
    rack = solid.translate([X_len/2,Y_len/2])(rack)
    rack = solid.translate([-alignment_offset[0],-alignment_offset[1]])(rack)
    wells = solid.linear_extrude(height=rack_thickness)(wells)
    rack = solid.difference()(rack,wells)
    return rack, rack_support

def make_pillar(wells,dims,grid_size,alignment_offset,rack_x,rack_y,pillar_height,rack_thickness,bolt_width,add_bolts=True,taper_angle=1,bolt_position_corner=1.5):

    #get X and Y dimensions of gride of pipette tips
    X_len = dims[0]*grid_size[0]
    Y_len = dims[1]*grid_size[1]
    #make rack
    rack = solid.cube([rack_x,rack_y,rack_thickness],center=True)
    
    if add_bolts:
    #add bolt holes
        bolt_hole=solid.cylinder(r=bolt_width/2,h=rack_thickness,center=True)()
        bolt_holes = []
        bolt_holes.append(solid.translate([rack_x/2-bolt_position_corner*bolt_width,rack_y/2-bolt_position_corner*bolt_width])(bolt_hole))
        bolt_holes.append(solid.translate([-rack_x/2+bolt_position_corner*bolt_width,rack_y/2-bolt_position_corner*bolt_width])(bolt_hole))
        bolt_holes.append(solid.translate([-rack_x/2+bolt_position_corner*bolt_width,-rack_y/2+bolt_position_corner*bolt_width])(bolt_hole))
        bolt_holes.append(solid.translate([rack_x/2-bolt_position_corner*bolt_width,-rack_y/2+bolt_position_corner*bolt_width])(bolt_hole))
        bolt_holes = solid.union()(*bolt_holes)
        rack=solid.difference()(rack,bolt_holes)
    rack_support = rack

    #center rack with pipette holes
    #rack = solid.translate([0,0,-rack_thickness])(rack)
    rack = solid.translate([X_len/2,Y_len/2])(rack)
    rack = solid.translate([-alignment_offset[0],-alignment_offset[1]])(rack)
    if not taper_angle == 0:
        wells=chamfer_extrude(pillar_height,taper_angle,segments=20)(wells)
    else:
        wells = solid.linear_extrude(height=pillar_height)(wells)
    rack = solid.union()(rack,wells)
    return rack, rack_support

def deg_taper_len(height,deg):
    if not deg == 0:
        return height*math.tan(math.radians(deg))
    else:
        return 0









 
 
************************************************/
